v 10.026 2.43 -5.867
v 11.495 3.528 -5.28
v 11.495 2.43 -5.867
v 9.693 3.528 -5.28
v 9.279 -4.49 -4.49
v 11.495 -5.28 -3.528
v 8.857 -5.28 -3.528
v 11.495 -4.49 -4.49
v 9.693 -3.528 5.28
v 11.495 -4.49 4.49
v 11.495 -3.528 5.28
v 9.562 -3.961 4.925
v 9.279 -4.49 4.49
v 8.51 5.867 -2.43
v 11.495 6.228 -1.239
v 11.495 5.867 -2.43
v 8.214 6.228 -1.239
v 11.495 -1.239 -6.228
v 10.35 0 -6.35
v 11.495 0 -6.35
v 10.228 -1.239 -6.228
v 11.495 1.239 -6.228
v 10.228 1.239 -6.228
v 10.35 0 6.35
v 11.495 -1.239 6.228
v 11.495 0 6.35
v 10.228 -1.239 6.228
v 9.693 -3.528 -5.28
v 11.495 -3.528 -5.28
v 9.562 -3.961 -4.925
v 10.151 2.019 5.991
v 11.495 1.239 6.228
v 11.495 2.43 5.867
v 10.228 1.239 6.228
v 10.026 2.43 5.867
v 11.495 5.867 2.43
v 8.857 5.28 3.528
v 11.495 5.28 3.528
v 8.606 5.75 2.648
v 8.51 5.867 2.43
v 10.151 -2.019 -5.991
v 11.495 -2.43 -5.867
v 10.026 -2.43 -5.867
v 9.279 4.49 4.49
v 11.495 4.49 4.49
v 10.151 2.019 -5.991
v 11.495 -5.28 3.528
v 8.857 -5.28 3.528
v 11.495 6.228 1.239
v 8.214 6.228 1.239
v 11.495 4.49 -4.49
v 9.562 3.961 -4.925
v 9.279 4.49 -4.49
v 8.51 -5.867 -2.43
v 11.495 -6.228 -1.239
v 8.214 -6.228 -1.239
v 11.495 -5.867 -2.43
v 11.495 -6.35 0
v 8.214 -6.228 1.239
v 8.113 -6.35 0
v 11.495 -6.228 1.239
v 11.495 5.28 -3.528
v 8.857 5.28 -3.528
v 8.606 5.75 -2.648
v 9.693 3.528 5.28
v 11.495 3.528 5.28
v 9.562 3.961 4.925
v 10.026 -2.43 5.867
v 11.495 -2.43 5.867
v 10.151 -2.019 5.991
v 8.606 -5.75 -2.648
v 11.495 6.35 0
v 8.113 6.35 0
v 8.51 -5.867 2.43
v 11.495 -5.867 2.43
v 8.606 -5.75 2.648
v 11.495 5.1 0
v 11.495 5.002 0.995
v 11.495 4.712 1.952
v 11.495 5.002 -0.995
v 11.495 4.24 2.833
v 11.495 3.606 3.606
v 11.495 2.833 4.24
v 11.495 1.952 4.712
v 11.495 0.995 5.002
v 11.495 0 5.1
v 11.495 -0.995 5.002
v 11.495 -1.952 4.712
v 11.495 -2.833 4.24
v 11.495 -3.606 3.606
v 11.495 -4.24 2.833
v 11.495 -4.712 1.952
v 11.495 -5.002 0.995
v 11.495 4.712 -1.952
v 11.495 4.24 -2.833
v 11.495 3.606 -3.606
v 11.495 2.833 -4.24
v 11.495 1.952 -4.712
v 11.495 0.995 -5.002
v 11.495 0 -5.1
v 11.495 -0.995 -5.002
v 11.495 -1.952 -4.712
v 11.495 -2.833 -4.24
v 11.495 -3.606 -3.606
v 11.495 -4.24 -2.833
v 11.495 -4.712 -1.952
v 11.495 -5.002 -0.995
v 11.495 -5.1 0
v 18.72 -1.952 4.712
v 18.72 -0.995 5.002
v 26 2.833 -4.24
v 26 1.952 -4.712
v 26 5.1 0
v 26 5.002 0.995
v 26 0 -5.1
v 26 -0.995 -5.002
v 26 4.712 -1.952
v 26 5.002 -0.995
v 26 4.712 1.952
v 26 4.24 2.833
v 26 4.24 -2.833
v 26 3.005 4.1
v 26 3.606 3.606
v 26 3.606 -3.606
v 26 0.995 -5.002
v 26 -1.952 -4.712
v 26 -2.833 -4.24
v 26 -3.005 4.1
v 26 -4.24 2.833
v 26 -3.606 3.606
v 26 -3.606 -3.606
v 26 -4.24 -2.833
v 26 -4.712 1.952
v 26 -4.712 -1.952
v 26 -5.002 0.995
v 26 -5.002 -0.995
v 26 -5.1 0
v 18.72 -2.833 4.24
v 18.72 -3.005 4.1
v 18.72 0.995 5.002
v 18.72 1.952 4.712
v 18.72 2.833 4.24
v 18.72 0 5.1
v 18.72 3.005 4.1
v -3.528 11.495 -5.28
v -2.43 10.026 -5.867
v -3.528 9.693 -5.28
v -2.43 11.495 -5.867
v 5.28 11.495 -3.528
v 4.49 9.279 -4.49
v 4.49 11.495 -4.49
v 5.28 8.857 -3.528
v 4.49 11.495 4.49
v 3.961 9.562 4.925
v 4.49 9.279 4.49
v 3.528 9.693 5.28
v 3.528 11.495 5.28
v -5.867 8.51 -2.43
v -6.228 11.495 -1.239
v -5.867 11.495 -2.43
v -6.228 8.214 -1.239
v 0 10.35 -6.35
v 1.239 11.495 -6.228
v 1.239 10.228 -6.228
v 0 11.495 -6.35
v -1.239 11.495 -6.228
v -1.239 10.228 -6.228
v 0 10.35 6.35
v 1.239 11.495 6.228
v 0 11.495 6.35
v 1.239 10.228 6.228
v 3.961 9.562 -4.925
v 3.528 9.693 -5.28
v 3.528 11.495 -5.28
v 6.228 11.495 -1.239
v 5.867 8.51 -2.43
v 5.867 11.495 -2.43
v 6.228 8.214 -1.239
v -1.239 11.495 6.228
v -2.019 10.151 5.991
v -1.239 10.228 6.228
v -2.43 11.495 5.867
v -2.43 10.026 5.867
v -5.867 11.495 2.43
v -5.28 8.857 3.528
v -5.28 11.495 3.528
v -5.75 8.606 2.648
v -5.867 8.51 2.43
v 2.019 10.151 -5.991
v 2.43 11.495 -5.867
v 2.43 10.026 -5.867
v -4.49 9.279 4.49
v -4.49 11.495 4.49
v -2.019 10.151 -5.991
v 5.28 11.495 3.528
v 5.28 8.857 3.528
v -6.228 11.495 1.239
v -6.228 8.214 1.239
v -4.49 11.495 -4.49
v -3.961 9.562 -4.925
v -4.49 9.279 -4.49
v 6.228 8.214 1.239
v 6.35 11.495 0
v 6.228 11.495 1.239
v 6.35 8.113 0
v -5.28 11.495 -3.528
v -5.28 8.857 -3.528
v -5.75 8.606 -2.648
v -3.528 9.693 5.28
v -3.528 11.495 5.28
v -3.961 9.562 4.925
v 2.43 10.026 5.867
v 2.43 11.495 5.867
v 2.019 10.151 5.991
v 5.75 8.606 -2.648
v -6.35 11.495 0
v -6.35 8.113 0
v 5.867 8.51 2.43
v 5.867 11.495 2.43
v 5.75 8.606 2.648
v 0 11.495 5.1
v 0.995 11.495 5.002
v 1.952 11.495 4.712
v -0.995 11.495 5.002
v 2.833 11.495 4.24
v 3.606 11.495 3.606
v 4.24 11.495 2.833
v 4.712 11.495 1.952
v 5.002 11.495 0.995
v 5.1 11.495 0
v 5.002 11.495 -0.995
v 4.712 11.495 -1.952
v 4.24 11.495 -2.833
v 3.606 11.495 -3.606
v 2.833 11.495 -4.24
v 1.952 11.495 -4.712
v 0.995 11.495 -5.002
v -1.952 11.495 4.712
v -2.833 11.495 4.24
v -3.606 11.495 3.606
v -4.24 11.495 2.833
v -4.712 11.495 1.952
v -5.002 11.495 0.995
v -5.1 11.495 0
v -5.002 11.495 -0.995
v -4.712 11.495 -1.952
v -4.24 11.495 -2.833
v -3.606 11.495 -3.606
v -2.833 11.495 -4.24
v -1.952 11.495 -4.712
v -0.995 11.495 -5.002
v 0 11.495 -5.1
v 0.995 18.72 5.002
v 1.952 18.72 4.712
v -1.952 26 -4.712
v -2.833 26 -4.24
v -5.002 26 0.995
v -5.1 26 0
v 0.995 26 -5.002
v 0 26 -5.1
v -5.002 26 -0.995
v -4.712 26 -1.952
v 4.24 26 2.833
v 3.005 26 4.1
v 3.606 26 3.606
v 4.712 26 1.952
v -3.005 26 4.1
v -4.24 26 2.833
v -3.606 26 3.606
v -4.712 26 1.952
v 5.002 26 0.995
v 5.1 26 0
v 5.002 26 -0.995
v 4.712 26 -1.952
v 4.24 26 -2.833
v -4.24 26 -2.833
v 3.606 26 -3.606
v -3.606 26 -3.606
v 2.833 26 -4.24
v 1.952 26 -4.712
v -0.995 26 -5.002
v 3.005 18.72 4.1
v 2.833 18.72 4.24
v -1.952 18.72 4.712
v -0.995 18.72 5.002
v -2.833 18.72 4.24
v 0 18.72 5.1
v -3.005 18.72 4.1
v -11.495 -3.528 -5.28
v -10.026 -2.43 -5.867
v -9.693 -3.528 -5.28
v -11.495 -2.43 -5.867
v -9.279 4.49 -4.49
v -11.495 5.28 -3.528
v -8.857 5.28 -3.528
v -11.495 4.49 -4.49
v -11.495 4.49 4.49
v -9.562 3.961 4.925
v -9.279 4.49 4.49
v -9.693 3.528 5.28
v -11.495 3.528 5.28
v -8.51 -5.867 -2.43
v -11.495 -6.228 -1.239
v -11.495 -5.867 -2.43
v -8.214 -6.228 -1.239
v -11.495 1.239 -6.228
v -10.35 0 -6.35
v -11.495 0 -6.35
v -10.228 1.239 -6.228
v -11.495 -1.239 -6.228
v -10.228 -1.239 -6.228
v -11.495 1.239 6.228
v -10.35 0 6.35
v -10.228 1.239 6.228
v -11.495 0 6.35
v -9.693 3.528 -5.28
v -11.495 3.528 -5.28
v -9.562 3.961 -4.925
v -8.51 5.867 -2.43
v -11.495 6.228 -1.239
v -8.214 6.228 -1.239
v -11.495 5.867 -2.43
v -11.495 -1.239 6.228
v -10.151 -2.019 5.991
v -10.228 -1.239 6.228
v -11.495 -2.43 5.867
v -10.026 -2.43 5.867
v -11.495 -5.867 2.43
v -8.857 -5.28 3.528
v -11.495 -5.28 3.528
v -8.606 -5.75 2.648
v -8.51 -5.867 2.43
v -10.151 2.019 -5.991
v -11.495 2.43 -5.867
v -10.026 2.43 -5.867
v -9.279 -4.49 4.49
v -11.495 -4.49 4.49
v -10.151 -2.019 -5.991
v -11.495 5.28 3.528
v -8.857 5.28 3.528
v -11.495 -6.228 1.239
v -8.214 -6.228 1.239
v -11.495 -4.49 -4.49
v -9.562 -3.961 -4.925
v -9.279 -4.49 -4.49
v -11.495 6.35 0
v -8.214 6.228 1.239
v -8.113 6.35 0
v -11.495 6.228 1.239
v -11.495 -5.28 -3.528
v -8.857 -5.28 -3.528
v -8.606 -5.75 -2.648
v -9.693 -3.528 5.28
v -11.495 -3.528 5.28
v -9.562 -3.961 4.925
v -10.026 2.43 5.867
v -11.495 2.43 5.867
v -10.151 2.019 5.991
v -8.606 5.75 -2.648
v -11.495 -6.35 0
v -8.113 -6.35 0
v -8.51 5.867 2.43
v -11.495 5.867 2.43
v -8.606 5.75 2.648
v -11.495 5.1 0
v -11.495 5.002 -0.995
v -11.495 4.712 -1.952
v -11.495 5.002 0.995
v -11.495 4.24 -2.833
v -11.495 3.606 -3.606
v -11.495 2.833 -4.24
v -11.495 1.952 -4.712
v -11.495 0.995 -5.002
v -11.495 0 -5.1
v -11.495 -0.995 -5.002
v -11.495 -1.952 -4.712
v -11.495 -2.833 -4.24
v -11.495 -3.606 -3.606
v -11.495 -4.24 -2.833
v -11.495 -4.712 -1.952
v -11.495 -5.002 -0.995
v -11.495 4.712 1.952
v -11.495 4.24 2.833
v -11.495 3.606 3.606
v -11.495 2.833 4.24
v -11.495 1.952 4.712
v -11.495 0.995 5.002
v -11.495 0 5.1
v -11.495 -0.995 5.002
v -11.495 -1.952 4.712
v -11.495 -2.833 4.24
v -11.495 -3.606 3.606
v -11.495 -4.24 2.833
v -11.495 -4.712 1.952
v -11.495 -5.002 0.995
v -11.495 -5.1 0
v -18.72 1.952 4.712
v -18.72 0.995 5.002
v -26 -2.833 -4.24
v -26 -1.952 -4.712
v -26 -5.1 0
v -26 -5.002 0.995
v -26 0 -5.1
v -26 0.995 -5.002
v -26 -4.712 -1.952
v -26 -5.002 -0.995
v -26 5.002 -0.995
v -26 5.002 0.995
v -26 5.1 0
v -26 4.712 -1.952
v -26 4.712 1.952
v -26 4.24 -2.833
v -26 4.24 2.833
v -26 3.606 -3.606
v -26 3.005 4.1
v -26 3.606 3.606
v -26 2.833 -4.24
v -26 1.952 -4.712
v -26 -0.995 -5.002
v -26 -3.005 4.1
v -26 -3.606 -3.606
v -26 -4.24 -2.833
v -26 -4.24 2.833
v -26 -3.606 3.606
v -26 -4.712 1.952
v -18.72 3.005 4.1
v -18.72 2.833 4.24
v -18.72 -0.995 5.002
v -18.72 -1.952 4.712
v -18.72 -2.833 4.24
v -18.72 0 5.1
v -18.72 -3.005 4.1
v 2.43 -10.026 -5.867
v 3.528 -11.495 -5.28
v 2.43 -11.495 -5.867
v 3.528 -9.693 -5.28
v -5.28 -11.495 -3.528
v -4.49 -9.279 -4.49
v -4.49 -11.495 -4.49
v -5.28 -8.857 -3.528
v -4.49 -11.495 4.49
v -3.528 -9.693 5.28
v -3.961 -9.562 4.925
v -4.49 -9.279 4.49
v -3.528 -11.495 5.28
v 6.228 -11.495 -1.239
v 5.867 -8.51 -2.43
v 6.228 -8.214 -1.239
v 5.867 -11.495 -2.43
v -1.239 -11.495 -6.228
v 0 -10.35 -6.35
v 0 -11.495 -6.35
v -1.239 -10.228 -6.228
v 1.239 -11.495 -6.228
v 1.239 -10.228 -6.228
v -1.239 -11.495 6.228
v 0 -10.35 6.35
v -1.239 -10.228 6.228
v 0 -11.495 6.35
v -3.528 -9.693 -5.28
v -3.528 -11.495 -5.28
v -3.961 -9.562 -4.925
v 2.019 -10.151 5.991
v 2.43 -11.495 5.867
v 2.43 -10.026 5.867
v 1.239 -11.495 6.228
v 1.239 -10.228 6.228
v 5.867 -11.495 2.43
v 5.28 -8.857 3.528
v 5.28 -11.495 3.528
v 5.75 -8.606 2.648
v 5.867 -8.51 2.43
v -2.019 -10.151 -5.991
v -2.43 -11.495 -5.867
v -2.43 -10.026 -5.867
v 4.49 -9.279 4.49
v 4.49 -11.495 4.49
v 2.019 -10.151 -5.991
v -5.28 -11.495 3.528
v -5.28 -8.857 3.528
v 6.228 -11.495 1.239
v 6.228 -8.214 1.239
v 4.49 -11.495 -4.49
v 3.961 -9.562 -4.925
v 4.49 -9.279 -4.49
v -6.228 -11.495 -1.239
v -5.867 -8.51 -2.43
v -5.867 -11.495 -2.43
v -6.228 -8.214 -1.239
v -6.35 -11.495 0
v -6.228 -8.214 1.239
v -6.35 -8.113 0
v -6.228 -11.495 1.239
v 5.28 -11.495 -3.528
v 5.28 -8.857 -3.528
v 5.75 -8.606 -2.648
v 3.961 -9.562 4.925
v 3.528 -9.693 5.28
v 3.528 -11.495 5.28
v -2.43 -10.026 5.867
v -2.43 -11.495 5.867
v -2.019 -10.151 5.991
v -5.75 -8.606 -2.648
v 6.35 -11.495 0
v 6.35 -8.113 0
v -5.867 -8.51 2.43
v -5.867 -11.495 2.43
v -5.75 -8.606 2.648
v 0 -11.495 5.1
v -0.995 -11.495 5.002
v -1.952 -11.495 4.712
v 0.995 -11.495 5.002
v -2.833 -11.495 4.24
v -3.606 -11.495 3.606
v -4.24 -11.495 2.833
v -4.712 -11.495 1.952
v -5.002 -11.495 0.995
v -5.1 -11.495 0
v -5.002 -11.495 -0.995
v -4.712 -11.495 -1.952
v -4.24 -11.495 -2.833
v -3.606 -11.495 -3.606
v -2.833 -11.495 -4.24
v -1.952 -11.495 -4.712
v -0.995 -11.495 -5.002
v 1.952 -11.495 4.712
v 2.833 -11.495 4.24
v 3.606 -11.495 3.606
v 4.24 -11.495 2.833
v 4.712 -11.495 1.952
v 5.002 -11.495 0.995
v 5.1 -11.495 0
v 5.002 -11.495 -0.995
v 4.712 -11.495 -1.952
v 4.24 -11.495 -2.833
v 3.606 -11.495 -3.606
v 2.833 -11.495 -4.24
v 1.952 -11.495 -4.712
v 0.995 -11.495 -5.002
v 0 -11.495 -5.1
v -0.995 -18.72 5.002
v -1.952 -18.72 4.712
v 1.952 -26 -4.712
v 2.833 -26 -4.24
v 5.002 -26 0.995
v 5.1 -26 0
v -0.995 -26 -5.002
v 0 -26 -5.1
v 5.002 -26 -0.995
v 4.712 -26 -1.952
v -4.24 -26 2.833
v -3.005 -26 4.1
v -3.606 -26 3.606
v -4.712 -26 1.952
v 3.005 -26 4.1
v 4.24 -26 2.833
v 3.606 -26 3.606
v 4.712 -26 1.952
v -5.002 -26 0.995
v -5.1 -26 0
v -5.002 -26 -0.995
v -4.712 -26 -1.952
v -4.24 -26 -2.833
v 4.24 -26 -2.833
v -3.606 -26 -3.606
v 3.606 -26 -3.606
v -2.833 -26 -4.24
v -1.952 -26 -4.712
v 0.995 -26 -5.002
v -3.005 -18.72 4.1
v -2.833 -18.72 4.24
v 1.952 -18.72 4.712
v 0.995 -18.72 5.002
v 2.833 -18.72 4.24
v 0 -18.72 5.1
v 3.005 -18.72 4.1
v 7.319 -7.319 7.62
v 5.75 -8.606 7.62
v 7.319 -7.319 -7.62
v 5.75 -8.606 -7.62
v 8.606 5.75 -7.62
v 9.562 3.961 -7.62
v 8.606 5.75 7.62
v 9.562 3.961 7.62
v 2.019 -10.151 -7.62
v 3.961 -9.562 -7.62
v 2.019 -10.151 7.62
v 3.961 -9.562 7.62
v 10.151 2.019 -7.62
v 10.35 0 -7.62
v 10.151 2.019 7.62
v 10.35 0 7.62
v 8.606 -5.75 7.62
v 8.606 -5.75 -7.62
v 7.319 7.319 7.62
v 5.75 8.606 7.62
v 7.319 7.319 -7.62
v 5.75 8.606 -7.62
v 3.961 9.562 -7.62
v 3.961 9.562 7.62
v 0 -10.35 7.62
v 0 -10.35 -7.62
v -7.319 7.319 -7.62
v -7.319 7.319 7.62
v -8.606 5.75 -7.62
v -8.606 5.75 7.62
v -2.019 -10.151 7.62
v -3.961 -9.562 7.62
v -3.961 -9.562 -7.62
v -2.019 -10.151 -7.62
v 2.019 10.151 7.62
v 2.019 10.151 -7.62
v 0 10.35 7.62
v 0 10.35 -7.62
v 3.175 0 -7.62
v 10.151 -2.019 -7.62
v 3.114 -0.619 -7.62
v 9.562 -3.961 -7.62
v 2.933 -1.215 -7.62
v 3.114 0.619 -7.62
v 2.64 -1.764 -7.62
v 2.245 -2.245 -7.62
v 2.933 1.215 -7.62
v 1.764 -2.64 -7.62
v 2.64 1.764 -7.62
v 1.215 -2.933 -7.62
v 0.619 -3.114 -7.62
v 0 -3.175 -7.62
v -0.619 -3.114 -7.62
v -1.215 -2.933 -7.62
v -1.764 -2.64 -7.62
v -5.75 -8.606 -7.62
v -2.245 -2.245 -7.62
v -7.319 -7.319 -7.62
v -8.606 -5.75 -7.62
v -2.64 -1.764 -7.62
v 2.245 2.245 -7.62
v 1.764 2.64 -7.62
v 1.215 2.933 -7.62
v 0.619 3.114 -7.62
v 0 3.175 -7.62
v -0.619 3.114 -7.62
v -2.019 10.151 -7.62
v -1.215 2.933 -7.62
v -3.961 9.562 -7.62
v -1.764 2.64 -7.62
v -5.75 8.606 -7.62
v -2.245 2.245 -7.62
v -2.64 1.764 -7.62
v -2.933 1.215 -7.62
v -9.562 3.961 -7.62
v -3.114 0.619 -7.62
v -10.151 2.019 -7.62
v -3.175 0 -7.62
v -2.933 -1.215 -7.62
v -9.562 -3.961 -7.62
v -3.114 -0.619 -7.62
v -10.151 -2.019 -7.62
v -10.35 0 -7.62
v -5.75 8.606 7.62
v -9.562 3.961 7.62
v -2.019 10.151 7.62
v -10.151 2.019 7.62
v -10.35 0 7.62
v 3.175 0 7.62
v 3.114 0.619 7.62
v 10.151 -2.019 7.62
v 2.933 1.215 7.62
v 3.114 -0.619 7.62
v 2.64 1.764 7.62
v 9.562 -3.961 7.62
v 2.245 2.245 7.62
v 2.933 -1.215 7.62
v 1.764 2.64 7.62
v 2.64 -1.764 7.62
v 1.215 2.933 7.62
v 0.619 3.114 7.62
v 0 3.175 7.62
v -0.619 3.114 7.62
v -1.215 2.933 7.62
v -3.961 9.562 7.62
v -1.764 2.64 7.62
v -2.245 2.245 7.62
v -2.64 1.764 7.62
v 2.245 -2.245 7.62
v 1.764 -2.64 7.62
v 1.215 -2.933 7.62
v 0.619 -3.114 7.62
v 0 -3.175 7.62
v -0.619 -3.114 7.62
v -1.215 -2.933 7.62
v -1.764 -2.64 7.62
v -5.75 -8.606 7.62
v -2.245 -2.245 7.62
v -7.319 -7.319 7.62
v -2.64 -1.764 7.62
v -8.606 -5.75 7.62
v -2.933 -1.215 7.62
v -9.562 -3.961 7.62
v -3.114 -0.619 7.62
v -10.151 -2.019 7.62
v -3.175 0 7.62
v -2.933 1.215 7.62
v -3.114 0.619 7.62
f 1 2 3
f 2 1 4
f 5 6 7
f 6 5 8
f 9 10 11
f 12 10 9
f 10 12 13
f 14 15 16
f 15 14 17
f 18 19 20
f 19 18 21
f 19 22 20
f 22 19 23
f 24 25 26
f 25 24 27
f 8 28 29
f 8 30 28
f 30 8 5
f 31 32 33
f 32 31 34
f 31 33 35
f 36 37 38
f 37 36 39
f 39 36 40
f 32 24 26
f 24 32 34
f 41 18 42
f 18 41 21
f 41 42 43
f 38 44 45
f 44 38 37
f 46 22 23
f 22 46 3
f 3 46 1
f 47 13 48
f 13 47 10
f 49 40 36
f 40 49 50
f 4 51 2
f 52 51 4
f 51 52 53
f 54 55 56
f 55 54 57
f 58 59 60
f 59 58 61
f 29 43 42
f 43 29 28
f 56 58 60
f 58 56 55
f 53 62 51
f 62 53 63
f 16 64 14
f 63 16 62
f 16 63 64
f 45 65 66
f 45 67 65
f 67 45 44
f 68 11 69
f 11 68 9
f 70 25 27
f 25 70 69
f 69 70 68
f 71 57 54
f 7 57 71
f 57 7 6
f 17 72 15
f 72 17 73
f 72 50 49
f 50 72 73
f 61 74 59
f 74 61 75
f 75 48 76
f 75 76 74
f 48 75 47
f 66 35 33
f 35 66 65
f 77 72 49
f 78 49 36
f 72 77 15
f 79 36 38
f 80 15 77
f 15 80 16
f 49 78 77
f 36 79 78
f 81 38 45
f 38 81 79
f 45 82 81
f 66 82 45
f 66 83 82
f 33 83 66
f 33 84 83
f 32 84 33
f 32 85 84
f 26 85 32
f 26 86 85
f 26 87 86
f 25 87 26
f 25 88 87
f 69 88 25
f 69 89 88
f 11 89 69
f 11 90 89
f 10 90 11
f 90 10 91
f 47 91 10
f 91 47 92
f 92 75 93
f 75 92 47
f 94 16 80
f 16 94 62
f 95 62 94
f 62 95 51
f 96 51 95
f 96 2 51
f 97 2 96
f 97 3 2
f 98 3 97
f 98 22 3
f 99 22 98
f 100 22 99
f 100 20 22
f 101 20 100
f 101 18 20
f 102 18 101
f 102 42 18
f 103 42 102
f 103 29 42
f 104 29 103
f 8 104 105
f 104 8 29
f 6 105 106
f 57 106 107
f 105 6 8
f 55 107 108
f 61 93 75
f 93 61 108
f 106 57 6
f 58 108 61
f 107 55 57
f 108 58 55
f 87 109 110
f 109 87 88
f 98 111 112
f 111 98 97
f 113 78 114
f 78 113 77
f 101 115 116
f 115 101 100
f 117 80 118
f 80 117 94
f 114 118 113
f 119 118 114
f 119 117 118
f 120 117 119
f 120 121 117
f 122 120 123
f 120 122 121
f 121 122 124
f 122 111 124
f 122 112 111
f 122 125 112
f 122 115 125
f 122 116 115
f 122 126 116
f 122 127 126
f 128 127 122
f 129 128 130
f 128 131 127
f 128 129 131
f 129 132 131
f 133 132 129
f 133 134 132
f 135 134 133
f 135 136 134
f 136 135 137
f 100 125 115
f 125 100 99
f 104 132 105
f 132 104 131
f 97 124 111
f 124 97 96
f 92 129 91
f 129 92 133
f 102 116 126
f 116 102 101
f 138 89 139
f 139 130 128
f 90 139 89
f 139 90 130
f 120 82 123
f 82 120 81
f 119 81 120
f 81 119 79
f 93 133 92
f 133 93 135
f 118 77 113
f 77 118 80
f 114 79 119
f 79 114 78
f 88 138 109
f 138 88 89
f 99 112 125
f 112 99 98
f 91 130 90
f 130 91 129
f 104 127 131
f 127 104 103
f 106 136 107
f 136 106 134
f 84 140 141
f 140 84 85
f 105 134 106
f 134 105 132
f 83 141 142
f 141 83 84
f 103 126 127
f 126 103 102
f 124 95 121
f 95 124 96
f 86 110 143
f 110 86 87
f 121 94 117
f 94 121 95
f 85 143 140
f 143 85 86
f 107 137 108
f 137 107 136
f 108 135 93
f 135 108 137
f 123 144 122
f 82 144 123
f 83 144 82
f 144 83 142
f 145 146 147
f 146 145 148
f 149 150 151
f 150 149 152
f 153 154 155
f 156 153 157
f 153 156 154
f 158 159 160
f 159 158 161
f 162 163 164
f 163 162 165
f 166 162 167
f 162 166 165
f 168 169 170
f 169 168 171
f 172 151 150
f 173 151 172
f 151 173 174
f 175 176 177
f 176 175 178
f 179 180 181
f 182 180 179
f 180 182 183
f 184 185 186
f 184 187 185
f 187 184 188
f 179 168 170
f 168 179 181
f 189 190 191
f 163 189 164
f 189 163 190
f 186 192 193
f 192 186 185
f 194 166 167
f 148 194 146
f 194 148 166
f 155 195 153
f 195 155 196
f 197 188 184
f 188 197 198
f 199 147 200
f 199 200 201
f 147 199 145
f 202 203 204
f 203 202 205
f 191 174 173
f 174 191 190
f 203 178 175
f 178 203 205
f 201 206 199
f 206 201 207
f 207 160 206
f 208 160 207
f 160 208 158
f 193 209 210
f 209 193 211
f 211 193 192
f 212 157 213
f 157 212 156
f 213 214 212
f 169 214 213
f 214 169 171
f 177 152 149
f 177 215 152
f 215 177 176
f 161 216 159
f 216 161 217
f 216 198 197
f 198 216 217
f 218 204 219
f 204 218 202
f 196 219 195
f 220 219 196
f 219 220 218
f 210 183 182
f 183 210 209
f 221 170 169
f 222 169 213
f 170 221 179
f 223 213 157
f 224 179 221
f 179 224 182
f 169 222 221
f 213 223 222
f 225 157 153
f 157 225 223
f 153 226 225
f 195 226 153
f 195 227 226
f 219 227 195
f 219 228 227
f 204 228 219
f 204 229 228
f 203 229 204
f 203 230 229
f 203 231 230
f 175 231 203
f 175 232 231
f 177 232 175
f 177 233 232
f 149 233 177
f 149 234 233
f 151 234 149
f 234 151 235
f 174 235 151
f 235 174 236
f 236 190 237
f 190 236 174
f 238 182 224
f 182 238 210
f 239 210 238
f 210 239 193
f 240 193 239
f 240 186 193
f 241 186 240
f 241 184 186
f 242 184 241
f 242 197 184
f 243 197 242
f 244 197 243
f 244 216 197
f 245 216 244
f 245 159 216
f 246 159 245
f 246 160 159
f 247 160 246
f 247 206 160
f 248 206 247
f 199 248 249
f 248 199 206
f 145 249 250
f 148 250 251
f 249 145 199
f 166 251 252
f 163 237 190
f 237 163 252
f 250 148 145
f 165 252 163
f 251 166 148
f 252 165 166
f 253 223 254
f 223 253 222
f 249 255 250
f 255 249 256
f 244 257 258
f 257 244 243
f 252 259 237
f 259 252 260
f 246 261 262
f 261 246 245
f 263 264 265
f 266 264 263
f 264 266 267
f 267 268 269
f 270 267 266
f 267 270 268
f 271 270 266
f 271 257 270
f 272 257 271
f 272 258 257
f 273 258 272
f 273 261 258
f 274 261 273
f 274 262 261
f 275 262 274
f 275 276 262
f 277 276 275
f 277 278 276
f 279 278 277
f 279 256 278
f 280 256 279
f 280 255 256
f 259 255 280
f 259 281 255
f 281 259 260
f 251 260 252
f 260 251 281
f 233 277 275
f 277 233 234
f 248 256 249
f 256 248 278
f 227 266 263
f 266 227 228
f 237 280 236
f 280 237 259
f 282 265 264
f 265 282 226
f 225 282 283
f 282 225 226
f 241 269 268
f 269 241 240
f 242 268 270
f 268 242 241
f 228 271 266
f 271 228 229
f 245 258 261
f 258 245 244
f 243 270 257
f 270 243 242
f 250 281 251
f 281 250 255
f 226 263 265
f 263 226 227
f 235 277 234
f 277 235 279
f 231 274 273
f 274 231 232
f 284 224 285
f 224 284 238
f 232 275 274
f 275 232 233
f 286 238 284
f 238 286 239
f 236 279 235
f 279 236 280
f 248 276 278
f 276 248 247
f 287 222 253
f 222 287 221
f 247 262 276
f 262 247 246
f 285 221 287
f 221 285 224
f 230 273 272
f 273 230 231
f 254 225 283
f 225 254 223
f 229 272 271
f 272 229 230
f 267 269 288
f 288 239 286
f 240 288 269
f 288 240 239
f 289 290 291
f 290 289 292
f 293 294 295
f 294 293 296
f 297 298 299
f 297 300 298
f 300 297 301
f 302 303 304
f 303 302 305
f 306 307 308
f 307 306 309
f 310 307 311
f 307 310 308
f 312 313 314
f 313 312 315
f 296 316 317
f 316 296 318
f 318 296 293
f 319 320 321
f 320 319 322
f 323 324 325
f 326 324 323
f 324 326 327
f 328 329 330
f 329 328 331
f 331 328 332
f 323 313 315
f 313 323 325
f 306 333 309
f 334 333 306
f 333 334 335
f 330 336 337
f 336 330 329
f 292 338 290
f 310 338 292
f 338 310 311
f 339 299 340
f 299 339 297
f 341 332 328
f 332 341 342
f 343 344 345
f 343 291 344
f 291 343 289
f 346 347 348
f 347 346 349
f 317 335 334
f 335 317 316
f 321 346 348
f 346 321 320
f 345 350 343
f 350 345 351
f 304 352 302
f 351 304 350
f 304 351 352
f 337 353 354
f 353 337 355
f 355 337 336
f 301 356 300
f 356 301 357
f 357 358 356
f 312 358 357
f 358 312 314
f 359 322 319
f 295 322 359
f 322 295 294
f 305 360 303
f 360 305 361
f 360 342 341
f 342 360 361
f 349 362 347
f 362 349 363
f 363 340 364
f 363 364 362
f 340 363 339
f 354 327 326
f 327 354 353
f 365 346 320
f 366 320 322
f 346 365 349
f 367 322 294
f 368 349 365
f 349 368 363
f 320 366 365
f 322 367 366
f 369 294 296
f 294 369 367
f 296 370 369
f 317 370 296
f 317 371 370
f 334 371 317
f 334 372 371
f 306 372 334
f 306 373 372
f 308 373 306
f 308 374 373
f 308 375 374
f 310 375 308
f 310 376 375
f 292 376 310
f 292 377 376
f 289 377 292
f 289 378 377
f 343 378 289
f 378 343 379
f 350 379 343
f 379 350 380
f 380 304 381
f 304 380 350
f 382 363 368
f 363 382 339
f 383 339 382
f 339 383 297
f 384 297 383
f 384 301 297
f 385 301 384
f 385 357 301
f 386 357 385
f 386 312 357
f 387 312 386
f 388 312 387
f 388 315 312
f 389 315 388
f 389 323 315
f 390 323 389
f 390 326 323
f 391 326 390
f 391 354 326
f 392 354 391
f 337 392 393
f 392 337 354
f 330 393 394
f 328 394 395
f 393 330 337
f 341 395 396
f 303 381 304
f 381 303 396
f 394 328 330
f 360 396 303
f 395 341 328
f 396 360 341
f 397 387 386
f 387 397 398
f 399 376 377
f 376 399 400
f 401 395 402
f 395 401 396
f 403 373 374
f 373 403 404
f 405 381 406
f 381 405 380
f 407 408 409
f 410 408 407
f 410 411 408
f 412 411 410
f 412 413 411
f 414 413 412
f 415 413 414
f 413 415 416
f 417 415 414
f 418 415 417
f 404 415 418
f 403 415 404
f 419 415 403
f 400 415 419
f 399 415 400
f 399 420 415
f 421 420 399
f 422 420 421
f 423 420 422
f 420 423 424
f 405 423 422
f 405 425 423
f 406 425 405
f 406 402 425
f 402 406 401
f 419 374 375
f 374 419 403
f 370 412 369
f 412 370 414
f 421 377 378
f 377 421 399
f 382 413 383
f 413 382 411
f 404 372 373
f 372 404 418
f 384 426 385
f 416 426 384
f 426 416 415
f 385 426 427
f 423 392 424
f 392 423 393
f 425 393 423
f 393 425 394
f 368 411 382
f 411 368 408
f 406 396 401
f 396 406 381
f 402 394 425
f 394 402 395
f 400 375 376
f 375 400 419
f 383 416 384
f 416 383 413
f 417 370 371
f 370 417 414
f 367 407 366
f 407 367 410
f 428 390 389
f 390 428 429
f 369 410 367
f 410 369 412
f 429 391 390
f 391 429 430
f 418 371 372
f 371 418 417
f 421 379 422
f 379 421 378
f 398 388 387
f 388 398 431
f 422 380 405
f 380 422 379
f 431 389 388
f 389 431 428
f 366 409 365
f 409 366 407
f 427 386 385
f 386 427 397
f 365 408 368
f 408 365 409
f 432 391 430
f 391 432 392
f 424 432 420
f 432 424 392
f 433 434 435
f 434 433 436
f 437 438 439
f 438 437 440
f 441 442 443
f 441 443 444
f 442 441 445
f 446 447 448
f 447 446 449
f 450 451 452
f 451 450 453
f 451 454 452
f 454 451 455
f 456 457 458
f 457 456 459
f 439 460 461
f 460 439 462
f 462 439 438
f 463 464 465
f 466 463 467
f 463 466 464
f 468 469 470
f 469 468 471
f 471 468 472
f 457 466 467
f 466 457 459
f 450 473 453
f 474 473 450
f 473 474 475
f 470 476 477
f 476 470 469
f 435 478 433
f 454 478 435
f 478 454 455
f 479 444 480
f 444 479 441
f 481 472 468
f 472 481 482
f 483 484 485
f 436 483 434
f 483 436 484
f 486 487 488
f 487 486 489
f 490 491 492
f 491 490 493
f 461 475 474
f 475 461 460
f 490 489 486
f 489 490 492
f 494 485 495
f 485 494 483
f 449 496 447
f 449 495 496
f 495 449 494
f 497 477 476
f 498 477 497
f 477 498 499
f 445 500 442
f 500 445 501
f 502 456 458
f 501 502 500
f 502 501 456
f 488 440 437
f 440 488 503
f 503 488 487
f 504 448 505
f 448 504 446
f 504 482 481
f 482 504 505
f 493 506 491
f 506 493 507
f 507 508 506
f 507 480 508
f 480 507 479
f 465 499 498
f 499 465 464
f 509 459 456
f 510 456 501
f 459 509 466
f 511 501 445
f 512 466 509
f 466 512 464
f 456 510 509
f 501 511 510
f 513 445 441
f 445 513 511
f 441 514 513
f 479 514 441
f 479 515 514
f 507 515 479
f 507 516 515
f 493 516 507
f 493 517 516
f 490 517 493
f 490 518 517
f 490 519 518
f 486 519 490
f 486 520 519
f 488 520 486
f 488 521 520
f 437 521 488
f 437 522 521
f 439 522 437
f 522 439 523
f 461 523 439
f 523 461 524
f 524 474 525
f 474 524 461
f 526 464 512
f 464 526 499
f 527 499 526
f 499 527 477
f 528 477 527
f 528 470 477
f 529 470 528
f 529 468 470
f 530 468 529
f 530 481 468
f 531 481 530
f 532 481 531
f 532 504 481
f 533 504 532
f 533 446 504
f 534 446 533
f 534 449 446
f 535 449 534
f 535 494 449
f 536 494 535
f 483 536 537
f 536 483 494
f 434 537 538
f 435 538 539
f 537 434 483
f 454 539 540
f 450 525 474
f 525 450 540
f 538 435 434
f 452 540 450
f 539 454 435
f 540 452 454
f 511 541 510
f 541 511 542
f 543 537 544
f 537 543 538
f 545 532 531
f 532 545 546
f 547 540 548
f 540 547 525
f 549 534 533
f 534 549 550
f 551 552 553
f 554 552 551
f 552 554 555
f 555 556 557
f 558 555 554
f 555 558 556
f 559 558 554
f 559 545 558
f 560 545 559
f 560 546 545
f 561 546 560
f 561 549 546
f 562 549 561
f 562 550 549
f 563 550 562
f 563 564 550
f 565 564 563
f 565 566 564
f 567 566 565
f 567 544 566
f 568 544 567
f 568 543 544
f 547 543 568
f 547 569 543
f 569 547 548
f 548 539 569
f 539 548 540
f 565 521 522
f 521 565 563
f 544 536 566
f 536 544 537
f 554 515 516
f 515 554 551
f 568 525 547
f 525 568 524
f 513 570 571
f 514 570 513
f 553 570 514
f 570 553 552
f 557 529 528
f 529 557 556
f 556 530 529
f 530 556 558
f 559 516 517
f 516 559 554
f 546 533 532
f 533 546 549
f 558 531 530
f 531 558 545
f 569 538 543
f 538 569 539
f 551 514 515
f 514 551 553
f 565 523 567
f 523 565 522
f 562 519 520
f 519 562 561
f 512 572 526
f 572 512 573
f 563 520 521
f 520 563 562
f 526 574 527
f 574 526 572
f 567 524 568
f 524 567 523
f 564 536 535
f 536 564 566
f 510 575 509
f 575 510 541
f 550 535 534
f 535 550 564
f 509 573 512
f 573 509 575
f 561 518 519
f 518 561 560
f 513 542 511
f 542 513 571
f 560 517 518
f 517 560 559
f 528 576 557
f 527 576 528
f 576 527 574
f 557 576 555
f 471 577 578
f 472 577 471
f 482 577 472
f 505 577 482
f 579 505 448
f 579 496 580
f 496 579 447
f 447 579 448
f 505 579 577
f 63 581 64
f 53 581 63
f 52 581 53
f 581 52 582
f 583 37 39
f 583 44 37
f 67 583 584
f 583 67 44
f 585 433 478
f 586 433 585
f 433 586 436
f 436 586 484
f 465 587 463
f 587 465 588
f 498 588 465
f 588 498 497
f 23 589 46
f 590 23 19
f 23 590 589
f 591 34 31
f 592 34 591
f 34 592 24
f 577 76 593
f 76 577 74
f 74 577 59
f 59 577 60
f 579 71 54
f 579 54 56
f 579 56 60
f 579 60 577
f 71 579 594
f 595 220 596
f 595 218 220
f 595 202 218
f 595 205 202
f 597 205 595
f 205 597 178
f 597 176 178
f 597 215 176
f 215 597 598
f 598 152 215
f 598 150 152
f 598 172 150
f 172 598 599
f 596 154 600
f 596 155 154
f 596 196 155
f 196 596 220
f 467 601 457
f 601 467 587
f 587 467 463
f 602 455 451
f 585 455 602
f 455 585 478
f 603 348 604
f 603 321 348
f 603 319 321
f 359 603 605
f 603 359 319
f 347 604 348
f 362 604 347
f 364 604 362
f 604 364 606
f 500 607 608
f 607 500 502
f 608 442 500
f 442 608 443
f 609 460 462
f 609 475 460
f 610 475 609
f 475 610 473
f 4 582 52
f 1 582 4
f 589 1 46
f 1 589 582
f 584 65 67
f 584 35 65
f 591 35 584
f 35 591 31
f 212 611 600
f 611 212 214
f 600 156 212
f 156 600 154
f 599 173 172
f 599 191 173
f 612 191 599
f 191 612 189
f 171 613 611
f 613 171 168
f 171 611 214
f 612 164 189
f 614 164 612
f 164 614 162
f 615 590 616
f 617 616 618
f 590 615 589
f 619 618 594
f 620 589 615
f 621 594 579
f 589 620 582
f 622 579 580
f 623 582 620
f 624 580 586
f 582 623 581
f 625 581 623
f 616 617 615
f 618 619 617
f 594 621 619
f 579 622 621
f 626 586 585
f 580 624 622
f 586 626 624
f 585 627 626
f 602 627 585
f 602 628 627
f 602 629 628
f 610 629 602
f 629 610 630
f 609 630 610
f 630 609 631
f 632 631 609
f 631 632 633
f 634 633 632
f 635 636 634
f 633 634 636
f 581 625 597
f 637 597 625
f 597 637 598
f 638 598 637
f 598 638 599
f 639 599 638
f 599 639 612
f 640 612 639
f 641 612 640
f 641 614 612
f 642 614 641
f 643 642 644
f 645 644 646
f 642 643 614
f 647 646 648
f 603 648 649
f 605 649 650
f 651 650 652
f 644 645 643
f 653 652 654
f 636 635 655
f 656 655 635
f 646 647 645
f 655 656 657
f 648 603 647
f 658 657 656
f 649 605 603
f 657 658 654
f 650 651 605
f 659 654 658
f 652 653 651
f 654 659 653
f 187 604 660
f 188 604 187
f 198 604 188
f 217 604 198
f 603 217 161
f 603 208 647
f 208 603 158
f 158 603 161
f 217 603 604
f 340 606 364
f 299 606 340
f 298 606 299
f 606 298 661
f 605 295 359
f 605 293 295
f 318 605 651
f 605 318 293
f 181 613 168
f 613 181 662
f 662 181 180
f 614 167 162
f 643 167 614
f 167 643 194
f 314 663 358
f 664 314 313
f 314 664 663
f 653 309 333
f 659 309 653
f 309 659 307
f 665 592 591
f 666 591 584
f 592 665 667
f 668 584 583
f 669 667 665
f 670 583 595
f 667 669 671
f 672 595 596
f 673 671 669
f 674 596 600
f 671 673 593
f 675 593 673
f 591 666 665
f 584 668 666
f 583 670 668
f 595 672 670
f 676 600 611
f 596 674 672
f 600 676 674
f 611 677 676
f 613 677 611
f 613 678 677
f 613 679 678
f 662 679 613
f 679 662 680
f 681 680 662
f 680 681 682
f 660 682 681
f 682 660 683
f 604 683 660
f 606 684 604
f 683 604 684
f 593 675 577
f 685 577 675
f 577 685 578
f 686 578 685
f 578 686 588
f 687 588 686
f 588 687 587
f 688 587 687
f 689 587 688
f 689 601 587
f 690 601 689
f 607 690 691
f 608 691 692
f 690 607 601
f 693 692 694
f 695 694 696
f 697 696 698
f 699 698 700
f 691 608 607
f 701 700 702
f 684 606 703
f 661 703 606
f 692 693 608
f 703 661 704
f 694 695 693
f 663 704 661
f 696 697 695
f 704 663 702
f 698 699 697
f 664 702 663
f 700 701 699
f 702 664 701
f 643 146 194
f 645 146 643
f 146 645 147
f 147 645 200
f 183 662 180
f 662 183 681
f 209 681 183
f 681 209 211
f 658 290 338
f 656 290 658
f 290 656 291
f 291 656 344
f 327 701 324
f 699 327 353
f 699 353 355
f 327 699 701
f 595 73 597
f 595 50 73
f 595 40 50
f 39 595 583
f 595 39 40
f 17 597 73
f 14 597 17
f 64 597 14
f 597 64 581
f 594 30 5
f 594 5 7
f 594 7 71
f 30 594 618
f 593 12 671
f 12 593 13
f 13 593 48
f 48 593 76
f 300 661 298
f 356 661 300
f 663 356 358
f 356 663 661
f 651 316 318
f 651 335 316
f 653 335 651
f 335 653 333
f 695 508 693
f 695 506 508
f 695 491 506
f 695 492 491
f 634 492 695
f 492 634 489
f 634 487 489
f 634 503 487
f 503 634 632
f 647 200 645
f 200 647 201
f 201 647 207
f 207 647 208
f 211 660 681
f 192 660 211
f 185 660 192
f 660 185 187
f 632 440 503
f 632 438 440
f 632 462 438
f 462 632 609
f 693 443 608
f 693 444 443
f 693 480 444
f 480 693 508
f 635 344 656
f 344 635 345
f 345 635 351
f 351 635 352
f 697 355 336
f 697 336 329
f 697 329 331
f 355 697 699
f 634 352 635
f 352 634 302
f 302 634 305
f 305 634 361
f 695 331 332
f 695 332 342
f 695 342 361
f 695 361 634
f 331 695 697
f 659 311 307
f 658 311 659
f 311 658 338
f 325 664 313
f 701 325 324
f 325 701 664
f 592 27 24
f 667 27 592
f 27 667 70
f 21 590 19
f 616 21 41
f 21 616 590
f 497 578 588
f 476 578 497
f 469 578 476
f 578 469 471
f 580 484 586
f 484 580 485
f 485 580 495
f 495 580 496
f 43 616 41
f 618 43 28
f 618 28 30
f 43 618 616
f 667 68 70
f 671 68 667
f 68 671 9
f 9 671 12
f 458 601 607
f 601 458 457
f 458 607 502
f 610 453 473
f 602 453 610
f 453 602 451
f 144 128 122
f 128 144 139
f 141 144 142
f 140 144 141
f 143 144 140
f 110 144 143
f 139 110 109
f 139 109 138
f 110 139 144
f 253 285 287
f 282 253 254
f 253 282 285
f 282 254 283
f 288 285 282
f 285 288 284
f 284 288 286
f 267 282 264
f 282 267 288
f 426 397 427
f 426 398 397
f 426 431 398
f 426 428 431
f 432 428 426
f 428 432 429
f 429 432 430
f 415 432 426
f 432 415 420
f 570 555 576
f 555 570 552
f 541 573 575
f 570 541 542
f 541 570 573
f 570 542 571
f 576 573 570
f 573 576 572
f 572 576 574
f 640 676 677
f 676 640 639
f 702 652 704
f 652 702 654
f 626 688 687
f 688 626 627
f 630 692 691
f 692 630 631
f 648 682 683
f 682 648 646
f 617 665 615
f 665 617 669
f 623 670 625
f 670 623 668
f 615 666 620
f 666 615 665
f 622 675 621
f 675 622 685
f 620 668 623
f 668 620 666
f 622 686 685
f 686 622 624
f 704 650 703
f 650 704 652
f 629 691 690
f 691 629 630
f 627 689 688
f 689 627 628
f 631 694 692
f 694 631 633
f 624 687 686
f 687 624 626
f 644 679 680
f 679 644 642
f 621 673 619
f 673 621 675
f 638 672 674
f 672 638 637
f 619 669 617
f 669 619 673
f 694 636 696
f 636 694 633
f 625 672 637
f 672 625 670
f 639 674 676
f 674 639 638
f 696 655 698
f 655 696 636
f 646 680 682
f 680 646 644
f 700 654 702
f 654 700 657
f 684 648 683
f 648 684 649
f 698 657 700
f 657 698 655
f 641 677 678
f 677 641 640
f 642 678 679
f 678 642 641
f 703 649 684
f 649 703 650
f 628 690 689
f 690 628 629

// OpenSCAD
$fn = 32;

// ----------------------------------------------------------------------
// Cardan cross: 52 mm span, 12.7 mm trunnions
// ----------------------------------------------------------------------

// --- parameters (mm) ---
journal_d = 12.7;         // trunnion diameter
arm_len = 26;             // trunnion length from the centre
step_r = 4.32;            // step position from the centre
step_d = 10.2;            // journal diameter after the step
hub_d = 20.7;             // hub diameter
hub_h = 15.24;            // hub height
bore_d = 6.35;            // hub bore
flat_d = 1;               // depth of the journal flat
flat_len = 7.28;          // length of the journal flat

difference() {
  union() {
    /* hub along the joint axis */
    cylinder(h = hub_h, d = hub_d, center = true);
    for (a = [0 : 90 : 270]) rotate([0, 0, a]) {
      /* trunnion, sunk into the hub */
      translate([hub_d / 4, 0, 0]) rotate([0, 90, 0]) cylinder(h = step_r + 2, d = journal_d);
      /* stepped journal out to the tip */
      translate([step_r - 0.5, 0, 0]) rotate([0, 90, 0]) cylinder(h = arm_len + 0.5 - step_r, d = step_d);
    }
  }
  /* lubrication bore through the hub, 2.5 mm clear on both sides */
  translate([0, 0, -hub_h / 2 - 2.5]) cylinder(h = hub_h + 5, d = bore_d);
  /* machined flat on each journal tip */
  for (a = [0 : 90 : 270]) rotate([0, 0, a]) {
    translate([arm_len - flat_len, -step_d, step_d / 2 - flat_d]) cube([flat_len + 0.5, 2 * step_d, flat_d + 2.5]);
  }
}
